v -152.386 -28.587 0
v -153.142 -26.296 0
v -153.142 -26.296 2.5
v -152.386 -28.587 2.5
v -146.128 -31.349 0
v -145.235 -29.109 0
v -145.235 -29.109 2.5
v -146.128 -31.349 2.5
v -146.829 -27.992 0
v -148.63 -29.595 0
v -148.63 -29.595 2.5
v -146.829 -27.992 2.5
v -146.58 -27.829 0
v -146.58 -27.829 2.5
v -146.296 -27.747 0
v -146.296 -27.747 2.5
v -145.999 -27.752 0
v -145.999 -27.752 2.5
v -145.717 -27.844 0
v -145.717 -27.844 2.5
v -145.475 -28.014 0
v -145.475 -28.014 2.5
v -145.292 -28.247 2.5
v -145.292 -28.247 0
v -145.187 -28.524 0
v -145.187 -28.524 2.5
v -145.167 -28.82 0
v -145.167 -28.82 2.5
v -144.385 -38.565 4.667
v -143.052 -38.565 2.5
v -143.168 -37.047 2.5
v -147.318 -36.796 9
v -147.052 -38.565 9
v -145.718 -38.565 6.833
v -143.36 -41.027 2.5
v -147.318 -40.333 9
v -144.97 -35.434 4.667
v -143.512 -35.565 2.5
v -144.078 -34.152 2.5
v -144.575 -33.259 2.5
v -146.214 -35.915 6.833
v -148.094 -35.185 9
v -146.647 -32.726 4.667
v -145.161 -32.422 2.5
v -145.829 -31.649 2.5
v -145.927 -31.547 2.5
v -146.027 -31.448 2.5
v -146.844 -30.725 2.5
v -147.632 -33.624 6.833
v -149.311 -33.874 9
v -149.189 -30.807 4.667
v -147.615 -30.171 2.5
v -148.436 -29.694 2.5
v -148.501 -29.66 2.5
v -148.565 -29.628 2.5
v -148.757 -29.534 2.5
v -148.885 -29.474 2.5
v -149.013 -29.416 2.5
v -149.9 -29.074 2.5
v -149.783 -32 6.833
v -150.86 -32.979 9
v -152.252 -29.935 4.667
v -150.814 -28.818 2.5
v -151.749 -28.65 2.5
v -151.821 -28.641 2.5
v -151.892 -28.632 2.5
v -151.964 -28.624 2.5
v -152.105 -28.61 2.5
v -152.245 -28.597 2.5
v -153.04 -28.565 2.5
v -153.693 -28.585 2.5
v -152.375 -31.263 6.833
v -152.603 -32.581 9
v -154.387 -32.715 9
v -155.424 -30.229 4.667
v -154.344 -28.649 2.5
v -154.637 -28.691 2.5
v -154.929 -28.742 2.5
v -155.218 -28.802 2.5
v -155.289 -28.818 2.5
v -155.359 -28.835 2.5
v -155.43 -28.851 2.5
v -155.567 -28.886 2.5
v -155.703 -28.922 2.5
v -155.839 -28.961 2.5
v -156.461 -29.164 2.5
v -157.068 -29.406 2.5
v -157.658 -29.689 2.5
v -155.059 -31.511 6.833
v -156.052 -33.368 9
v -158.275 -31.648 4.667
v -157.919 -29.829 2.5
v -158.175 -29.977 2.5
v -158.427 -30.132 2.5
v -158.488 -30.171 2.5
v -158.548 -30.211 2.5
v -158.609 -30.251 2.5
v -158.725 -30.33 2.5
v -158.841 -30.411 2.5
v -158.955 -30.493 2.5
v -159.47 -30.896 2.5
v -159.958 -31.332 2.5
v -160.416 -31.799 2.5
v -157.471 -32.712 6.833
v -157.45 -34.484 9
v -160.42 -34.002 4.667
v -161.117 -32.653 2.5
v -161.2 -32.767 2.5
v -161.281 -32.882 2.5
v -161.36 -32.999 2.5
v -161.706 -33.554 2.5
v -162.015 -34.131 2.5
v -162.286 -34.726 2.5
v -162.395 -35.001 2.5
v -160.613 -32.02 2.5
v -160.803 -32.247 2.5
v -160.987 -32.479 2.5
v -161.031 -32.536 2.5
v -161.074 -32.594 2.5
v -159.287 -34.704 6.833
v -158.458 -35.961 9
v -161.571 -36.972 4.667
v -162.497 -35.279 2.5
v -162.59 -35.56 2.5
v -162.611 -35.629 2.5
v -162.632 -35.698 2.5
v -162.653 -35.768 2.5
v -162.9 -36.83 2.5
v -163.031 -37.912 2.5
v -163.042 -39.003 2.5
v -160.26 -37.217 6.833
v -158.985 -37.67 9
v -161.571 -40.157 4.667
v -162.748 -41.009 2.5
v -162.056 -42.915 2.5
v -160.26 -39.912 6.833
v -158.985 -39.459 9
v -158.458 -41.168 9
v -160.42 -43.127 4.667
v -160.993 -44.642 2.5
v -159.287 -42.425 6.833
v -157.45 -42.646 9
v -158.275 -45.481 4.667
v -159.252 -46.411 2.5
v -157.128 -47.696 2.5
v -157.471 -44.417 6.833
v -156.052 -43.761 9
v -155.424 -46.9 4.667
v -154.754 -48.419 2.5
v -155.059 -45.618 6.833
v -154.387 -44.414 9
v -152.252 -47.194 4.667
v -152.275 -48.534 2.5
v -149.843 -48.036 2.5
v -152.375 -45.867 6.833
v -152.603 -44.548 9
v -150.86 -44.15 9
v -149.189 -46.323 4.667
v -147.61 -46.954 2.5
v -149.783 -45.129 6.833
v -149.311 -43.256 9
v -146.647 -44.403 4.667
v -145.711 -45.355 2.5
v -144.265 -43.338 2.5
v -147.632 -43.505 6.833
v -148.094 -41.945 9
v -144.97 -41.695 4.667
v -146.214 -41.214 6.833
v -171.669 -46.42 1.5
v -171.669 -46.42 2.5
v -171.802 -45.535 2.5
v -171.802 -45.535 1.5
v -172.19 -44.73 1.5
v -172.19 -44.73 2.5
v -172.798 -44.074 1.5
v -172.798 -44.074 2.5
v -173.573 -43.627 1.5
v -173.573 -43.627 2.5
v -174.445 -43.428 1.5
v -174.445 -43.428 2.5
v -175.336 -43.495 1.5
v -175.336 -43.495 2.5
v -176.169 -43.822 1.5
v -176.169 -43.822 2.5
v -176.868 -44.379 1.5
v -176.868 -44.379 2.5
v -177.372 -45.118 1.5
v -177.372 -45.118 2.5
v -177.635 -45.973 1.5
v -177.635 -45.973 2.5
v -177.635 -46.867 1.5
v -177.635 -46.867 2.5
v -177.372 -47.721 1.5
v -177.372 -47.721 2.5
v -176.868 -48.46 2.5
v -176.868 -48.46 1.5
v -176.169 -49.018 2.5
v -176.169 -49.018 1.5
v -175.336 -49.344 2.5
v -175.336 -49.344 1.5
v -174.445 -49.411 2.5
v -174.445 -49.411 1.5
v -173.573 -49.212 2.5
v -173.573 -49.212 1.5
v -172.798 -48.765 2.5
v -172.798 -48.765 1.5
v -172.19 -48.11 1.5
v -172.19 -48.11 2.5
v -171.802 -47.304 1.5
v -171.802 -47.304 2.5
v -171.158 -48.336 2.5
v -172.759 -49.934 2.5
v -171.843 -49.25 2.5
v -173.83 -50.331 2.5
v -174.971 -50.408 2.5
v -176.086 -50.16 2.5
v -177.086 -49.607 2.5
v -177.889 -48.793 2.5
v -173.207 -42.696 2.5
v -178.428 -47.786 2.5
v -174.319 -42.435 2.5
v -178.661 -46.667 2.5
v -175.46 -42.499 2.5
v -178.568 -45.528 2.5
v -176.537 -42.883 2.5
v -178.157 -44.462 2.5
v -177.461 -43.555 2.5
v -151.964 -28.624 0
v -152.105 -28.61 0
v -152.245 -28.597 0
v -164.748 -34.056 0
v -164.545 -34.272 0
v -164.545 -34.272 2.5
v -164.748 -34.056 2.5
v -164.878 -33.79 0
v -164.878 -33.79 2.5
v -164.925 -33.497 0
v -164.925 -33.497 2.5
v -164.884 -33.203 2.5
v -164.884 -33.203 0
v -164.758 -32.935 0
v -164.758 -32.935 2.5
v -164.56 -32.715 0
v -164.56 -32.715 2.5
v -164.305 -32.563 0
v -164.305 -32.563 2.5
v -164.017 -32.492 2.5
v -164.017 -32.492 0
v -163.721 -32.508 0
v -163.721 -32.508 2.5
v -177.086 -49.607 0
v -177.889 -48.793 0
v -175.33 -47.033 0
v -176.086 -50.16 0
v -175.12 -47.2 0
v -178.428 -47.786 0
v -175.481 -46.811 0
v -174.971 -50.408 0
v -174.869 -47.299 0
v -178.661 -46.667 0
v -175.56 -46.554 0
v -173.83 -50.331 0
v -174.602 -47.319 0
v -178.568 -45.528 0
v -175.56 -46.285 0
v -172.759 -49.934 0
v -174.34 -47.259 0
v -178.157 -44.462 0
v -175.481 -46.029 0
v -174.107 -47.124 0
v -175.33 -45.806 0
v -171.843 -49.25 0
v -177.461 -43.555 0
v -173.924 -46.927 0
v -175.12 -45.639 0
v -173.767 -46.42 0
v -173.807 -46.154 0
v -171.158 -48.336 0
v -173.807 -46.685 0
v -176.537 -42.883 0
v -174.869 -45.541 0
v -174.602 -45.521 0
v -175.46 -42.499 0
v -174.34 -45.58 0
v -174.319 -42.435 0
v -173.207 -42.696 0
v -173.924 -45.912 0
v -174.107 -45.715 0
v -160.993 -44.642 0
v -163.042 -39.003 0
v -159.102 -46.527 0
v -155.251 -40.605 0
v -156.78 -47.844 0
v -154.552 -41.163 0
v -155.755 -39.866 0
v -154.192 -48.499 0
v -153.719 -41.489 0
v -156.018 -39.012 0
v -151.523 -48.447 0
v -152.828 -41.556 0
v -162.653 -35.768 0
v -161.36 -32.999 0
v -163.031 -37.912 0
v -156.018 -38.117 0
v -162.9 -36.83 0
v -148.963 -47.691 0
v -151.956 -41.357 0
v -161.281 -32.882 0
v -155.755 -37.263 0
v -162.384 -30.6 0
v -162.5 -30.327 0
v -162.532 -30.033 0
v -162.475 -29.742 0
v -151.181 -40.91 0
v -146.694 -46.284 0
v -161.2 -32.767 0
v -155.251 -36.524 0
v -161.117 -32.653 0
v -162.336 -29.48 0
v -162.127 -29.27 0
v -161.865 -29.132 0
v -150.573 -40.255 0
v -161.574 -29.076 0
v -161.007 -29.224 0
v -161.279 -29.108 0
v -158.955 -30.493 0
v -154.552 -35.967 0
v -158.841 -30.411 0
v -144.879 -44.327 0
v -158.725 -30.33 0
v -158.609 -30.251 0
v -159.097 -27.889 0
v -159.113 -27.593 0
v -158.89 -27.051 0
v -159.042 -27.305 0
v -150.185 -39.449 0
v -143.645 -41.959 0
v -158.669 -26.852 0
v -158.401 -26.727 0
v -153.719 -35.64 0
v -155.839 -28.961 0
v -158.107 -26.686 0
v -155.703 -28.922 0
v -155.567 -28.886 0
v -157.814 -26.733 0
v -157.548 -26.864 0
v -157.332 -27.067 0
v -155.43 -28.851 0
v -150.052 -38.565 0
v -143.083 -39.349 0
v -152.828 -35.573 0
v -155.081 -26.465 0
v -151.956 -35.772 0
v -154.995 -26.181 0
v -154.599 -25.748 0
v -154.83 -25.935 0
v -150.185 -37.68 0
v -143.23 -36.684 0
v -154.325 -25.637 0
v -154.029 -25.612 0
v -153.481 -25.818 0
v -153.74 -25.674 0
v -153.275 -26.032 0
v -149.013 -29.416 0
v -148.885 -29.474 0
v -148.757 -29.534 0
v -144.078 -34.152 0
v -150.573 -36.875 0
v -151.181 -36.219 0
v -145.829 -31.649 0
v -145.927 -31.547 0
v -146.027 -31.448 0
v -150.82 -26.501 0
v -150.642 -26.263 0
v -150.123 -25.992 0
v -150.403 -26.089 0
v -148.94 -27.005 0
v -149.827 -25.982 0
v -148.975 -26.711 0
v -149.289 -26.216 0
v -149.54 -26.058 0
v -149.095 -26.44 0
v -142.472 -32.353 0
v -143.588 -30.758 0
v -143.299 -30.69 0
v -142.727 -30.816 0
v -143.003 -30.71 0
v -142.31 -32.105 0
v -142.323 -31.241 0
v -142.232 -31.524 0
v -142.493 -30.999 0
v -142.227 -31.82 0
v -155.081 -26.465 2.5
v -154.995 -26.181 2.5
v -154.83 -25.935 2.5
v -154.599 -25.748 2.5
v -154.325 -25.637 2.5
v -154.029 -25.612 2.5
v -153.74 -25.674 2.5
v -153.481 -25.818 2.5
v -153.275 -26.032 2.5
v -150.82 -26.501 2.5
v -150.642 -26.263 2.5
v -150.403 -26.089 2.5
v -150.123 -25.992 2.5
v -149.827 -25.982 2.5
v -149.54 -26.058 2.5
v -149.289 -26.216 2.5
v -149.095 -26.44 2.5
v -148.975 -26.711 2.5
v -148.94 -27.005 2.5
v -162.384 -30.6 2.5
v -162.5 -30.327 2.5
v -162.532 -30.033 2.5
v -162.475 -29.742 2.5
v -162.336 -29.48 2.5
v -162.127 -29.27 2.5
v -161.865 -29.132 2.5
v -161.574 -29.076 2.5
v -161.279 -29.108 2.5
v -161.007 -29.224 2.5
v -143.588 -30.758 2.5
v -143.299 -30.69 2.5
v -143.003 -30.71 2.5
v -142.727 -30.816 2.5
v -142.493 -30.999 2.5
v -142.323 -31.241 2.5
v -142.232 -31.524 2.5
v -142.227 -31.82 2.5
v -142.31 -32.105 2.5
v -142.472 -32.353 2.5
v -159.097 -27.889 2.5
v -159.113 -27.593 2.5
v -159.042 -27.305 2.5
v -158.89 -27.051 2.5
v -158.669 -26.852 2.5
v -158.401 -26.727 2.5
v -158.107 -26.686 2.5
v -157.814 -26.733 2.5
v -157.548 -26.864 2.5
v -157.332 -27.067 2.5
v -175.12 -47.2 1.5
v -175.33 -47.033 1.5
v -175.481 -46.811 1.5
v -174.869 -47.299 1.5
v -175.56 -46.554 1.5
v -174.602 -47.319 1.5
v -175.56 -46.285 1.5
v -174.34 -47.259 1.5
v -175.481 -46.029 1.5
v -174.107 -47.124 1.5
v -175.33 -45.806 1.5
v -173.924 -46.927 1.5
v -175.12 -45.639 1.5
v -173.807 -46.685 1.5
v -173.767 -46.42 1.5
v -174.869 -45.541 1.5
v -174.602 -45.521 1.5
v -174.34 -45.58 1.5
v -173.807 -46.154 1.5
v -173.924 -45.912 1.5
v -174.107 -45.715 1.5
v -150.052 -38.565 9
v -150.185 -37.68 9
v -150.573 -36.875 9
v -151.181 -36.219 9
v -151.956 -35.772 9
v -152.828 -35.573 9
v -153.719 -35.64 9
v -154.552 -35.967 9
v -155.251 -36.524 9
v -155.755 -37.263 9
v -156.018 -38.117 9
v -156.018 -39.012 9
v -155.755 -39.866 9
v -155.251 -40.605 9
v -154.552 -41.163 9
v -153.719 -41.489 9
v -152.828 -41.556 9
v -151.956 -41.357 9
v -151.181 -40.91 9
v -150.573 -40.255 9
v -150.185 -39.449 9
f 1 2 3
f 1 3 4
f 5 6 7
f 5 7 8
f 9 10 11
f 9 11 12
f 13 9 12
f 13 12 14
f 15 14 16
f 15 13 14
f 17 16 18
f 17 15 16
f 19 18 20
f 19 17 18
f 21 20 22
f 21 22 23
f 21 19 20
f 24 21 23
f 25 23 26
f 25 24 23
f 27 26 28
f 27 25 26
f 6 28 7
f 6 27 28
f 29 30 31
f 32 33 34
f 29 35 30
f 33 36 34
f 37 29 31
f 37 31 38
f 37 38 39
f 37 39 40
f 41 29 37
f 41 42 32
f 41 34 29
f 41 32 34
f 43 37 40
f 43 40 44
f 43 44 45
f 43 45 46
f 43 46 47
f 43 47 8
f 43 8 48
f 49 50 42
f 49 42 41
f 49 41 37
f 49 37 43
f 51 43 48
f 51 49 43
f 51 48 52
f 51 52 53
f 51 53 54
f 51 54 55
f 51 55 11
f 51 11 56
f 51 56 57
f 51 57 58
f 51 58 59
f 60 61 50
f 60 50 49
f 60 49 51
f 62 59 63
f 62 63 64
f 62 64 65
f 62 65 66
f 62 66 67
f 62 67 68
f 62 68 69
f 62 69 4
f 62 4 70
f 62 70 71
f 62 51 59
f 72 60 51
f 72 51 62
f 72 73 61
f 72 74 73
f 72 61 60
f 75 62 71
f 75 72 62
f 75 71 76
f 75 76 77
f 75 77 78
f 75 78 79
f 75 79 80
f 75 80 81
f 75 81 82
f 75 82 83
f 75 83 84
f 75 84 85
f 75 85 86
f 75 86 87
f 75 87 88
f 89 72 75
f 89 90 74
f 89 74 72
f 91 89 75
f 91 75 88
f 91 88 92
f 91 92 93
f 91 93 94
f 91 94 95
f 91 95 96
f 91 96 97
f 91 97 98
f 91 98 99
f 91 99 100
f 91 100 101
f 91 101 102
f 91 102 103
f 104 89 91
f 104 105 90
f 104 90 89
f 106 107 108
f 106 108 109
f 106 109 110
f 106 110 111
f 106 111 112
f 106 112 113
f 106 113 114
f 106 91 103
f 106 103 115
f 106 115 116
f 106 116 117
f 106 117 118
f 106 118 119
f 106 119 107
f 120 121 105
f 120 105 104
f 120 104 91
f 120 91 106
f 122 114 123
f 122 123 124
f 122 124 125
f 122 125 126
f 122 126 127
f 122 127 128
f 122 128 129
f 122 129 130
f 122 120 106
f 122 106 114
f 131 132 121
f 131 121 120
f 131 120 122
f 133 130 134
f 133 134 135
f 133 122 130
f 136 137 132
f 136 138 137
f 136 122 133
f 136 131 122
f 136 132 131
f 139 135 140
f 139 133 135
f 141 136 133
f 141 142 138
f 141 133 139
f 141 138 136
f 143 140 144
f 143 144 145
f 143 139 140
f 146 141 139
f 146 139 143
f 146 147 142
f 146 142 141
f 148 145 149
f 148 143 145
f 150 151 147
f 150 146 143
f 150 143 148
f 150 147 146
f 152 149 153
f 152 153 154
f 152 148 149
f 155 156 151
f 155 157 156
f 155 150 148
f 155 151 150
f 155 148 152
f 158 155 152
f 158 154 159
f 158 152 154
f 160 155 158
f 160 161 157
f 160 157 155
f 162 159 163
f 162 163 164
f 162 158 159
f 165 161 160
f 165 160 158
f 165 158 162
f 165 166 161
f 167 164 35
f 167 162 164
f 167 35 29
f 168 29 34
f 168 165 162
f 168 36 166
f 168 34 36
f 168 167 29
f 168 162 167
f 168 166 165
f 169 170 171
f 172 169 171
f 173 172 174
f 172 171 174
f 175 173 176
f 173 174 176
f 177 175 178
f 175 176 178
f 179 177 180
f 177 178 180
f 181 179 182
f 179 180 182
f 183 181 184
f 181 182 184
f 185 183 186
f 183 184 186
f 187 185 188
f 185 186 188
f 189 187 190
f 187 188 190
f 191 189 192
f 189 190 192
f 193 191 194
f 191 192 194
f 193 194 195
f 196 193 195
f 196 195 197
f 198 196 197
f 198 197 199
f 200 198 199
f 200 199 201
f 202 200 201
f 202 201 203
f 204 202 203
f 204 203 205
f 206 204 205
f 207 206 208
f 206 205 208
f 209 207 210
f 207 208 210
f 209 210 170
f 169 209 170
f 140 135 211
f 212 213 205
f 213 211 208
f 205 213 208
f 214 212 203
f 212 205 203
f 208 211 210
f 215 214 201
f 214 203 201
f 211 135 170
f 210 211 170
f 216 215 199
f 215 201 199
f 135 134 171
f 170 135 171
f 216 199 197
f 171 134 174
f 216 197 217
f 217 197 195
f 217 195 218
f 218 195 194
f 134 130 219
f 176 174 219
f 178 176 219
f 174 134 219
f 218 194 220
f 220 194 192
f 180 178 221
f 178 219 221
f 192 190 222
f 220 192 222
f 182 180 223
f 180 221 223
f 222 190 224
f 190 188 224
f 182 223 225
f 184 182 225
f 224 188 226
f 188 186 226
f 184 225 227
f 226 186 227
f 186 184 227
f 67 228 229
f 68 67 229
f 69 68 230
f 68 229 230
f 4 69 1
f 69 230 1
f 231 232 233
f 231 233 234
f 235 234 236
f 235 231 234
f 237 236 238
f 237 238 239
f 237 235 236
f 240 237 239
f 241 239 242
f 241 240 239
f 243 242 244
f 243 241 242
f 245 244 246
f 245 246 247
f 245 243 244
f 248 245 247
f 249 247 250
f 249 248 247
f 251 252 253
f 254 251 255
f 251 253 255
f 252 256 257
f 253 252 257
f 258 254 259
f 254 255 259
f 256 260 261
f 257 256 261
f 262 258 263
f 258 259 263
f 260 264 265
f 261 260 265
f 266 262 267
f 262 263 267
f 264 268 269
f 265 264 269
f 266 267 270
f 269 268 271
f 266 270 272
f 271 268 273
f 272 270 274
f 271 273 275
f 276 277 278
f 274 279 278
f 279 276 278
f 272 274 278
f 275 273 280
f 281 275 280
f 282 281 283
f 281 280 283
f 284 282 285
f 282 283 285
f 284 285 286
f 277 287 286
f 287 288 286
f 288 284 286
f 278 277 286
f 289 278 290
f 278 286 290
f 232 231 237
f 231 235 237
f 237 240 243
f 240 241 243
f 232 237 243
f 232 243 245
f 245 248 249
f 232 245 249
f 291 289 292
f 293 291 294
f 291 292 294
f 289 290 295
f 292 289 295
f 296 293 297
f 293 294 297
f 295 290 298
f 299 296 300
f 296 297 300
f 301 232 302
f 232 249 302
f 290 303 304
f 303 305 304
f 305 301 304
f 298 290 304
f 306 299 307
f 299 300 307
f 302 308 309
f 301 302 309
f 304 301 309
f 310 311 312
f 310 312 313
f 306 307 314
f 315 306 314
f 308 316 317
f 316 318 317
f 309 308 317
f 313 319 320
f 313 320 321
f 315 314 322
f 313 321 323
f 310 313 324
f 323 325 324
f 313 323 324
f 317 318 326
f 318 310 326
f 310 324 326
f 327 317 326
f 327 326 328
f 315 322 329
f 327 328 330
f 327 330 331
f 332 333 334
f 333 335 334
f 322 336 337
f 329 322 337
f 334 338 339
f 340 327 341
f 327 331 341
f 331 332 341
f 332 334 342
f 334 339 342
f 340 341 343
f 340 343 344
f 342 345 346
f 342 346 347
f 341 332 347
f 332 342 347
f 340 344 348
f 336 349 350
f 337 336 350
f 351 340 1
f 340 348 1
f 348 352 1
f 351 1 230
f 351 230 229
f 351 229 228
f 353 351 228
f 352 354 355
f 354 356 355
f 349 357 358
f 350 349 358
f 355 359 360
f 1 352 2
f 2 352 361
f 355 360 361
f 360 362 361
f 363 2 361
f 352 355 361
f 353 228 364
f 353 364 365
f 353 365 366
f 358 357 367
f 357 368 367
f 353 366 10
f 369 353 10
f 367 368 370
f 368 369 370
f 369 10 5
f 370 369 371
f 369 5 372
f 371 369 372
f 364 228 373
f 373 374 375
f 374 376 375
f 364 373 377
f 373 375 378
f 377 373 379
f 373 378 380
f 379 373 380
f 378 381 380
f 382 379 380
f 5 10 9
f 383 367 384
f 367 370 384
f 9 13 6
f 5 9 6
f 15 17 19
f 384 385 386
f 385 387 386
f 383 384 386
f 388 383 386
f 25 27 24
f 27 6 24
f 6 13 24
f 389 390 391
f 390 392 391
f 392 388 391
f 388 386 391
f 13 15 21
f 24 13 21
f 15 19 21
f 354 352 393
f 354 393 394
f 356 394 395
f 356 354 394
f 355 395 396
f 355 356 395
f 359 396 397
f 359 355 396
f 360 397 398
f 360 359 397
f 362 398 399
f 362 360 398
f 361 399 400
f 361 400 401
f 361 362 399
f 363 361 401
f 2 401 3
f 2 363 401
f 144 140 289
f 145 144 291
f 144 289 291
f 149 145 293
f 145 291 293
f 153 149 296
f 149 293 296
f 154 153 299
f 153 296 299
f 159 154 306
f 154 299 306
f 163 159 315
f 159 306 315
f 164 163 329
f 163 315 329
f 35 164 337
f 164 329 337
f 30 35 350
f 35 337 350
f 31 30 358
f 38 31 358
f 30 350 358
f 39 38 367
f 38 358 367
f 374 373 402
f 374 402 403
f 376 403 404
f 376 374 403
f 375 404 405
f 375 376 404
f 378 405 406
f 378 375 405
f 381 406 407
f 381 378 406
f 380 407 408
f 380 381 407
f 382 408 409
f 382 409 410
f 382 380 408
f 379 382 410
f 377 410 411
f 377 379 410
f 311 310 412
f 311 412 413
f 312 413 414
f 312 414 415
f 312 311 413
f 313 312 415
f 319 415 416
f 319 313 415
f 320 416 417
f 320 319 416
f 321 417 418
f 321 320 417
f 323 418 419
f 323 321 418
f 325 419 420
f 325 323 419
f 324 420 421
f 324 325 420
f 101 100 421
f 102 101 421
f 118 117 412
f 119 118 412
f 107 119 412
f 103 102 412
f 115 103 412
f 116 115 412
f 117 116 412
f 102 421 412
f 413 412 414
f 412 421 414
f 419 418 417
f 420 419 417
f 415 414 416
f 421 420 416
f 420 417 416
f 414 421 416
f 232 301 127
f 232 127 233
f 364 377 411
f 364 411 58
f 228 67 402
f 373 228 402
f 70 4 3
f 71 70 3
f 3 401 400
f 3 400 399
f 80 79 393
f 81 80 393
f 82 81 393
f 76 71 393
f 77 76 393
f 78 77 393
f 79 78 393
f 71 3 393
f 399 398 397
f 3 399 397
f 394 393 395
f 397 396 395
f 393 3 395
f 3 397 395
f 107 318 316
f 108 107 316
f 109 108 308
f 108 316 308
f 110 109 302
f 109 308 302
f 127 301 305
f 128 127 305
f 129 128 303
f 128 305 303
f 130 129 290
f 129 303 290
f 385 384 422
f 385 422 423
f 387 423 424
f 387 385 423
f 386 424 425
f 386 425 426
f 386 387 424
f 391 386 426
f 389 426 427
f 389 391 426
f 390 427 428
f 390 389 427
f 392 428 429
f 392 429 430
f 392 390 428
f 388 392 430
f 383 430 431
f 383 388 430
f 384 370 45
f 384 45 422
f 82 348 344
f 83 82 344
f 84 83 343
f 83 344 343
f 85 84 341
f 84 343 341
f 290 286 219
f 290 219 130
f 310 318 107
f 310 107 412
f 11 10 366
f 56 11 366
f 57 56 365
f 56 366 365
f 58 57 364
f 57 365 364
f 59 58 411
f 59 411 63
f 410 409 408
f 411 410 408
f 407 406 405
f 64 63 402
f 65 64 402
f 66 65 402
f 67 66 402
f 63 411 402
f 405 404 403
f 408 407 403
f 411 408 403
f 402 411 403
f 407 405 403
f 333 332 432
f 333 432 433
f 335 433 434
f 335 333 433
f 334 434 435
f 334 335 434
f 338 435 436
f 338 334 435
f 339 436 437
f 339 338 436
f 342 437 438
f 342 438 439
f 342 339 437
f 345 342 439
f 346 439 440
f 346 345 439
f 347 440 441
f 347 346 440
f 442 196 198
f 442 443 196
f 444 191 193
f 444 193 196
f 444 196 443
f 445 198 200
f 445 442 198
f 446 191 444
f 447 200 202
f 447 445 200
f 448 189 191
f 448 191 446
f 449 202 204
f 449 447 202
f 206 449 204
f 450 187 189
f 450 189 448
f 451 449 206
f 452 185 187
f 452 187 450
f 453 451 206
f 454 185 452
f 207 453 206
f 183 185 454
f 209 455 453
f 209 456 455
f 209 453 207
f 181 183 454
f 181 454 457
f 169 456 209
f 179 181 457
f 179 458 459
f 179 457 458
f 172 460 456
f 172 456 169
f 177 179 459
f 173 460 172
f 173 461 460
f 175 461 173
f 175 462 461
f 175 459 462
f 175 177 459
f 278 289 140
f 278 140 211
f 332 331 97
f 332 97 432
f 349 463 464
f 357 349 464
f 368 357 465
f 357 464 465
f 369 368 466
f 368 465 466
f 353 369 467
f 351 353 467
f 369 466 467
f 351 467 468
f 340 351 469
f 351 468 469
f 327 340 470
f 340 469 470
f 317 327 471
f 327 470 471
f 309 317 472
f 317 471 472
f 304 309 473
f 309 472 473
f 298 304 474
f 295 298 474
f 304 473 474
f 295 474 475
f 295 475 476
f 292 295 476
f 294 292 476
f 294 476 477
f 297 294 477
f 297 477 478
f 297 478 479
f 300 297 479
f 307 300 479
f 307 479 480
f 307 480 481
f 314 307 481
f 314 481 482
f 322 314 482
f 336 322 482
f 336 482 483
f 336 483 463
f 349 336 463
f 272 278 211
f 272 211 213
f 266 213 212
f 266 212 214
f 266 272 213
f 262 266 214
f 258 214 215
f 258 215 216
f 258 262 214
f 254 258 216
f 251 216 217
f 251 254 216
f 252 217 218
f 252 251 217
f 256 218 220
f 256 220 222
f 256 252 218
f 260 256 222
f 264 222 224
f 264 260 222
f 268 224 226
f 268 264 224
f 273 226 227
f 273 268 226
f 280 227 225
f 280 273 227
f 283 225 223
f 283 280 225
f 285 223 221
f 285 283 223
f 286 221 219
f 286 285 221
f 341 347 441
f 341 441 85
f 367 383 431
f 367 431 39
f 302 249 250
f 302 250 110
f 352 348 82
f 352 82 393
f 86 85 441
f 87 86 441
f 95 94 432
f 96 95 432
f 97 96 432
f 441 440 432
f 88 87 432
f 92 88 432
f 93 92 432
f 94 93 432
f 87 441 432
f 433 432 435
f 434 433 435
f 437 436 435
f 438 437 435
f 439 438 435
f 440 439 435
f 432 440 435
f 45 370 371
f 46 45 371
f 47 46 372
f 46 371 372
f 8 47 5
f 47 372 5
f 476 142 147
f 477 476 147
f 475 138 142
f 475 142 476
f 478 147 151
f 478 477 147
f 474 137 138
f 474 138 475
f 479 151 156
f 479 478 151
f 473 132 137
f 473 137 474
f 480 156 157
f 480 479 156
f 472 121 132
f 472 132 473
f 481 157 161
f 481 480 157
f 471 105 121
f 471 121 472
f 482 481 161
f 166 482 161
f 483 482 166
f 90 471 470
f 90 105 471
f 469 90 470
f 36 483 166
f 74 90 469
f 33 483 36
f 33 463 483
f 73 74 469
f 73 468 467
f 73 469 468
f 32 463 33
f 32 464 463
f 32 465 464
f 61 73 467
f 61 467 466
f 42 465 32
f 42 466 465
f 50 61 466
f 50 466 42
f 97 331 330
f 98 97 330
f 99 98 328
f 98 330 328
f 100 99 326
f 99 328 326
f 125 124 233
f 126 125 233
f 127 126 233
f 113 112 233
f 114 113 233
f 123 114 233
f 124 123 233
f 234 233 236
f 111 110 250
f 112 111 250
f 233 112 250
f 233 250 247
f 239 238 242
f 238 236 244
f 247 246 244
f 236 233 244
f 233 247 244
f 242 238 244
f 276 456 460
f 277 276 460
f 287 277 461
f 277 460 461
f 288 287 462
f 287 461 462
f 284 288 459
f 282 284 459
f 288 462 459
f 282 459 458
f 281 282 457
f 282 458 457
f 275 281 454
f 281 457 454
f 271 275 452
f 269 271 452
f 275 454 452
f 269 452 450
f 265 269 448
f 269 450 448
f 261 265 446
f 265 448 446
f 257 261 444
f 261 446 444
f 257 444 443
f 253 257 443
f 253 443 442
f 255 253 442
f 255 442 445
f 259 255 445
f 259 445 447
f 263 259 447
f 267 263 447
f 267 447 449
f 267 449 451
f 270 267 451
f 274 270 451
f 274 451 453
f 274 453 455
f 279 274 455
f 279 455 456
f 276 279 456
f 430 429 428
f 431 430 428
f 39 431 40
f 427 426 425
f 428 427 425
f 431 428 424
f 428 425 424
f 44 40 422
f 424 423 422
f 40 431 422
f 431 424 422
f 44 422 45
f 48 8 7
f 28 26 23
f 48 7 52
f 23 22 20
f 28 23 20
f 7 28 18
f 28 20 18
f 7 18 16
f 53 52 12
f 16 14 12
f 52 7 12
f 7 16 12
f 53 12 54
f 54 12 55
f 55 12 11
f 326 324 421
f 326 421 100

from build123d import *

# Parameters (mm, degrees)
CROQUIS1_R              = 10
SALIENTE_EXTRUIR1_DEPTH = 9
CHAFL_N1_SIZE           = 6.5
CHAFL_N1_SIZE2          = 4
SALIENTE_EXTRUIR3_DEPTH = 2.5
CROQUIS4_R              = 3
CORTAR_EXTRUIR1_DEPTH   = 186.864758197
CROQUIS5_R              = 3
CORTAR_EXTRUIR2_DEPTH   = 1
CROQUIS6_R              = 0.901496021
CORTAR_EXTRUIR3_DEPTH   = 16
SALIENTE_EXTRUIR4_DEPTH = 2.5


with BuildPart() as part:
    # Croquis1 → Saliente-Extruir1 (new body)
    with BuildSketch(Plane.XY):
        with Locations((-153.051797491, -38.56459666)):
            Circle(CROQUIS1_R)
    extrude(amount=SALIENTE_EXTRUIR1_DEPTH)

    # Chaflán1
    chafl_n1_edges = [part.edges().sort_by_distance(p)[0] for p in [
        (-163.051797491, -38.56459666, 9),
    ]]
    chafl_n1_side = [part.faces().sort_by_distance(p)[0] for p in [
        (-163.051797491, -38.56459666, 4.5),
    ]]
    chamfer(chafl_n1_edges, length=CHAFL_N1_SIZE, length2=CHAFL_N1_SIZE2, reference=chafl_n1_side[0])

    # Croquis3 → Saliente-Extruir3 (add)
    with BuildSketch(Plane(origin=(0, 0, 0), x_dir=(-1, 0, 0), z_dir=(0, 0, -1))):
        with BuildLine():
            Line((152.02722324, -41.384215004), (171.157627564, -48.335694708))
            ThreePointArc((171.157627564, -48.335694708), (178.428362583, -47.785764923), (173.206776067, -42.696458021))
            Line((173.206776067, -42.696458021), (154.076371743, -35.744978316))
            Line((154.076371743, -35.744978316), (152.02722324, -41.384215004))
        make_face()
    extrude(amount=-SALIENTE_EXTRUIR3_DEPTH)

    # Croquis4 → Cortar-Extruir1 (cut, through all)
    with BuildSketch(Plane.XY.offset(9)):
        with Locations((-153.051797491, -38.56459666)):
            Circle(CROQUIS4_R)
    extrude(amount=-CORTAR_EXTRUIR1_DEPTH, mode=Mode.SUBTRACT)

    # Croquis5 → Cortar-Extruir2 (cut)
    with BuildSketch(Plane.XY.offset(2.5)):
        with Locations((-174.668871458, -46.419665921)):
            Circle(CROQUIS5_R)
    extrude(amount=-CORTAR_EXTRUIR2_DEPTH, mode=Mode.SUBTRACT)

    # Croquis6 → Cortar-Extruir3 (cut)
    with BuildSketch(Plane.XY.offset(1.5)):
        with Locations((-174.668871458, -46.419665921)):
            Circle(CROQUIS6_R)
    extrude(amount=-CORTAR_EXTRUIR3_DEPTH, mode=Mode.SUBTRACT)

    # Croquis7 → Saliente-Extruir4 (add)
    with BuildSketch(Plane(origin=(0, 0, 0), x_dir=(-1, 0, 0), z_dir=(0, 0, -1))):
        with BuildLine():
            Line((142.472154892, -32.352593723), (144.077837211, -34.152336821))
            ThreePointArc((144.077837211, -34.152336821), (144.857254661, -32.833151134), (145.829058872, -31.648525027))
            Line((145.829058872, -31.648525027), (143.587737332, -30.757588058))
            ThreePointArc((143.587737332, -30.757588058), (142.398891813, -31.113717477), (142.472154892, -32.352593723))
        make_face()
        with BuildLine():
            Line((145.234815545, -29.108772462), (146.128114979, -31.349153467))
            ThreePointArc((146.128114979, -31.349153467), (147.223071886, -30.438960819), (148.436199285, -29.693505791))
            ThreePointArc((148.436199285, -29.693505791), (148.532872379, -29.643872708), (148.63007912, -29.595293084))
            Line((148.63007912, -29.595293084), (146.828644198, -27.991509074))
            ThreePointArc((146.828644198, -27.991509074), (145.589691401, -27.919552146), (145.234815545, -29.108772462))
        make_face()
        with BuildLine():
            Line((148.940319587, -27.005463152), (149.013491041, -29.416259051))
            ThreePointArc((149.013491041, -29.416259051), (150.353718186, -28.935455054), (151.748645686, -28.649870472))
            ThreePointArc((151.748645686, -28.649870472), (151.856464194, -28.636294775), (151.964423861, -28.623891525))
            Line((151.964423861, -28.623891525), (150.820155195, -26.500700496))
            ThreePointArc((150.820155195, -26.500700496), (149.680531113, -26.009336288), (148.940319587, -27.005463152))
        make_face()
        with BuildLine():
            ThreePointArc((155.218271428, -28.802097457), (155.324230846, -28.826216577), (155.42992191, -28.851485714))
            Line((155.42992191, -28.851485714), (155.080835189, -26.464975839))
            ThreePointArc((155.080835189, -26.464975839), (154.177995305, -25.613470127), (153.141728543, -26.296355938))
            Line((153.141728543, -26.296355938), (152.38594646, -28.586789165))
            ThreePointArc((152.38594646, -28.586789165), (153.366736356, -28.569557215), (154.344495765, -28.648502108))
            ThreePointArc((154.344495765, -28.648502108), (154.783087756, -28.715605137), (155.218271428, -28.802097457))
        make_face()
        with BuildLine():
            ThreePointArc((158.426588439, -30.131825925), (158.517908498, -30.190730739), (158.608583057, -30.250624434))
            Line((158.608583057, -30.250624434), (159.09678329, -27.888644024))
            ThreePointArc((159.09678329, -27.888644024), (158.53962342, -26.779700963), (157.332290487, -27.066979615))
            Line((157.332290487, -27.066979615), (155.83871334, -28.96079012))
            ThreePointArc((155.83871334, -28.96079012), (156.766248042, -29.280047284), (157.6580406, -29.688644631))
            ThreePointArc((157.6580406, -29.688644631), (158.047231669, -29.901708148), (158.426588439, -30.131825925))
        make_face()
        with BuildLine():
            ThreePointArc((160.986626339, -32.478670998), (161.052292491, -32.565256717), (161.117013855, -32.652550905))
            Line((161.117013855, -32.652550905), (162.38361689, -30.599989658))
            ThreePointArc((162.38361689, -30.599989658), (162.239338735, -29.367364148), (161.006561803, -29.224385594))
            Line((161.006561803, -29.224385594), (158.955337038, -30.493151881))
            ThreePointArc((158.955337038, -30.493151881), (159.717742172, -31.110391034), (160.416004535, -31.799357964))
            ThreePointArc((160.416004535, -31.799357964), (160.708852496, -32.132683364), (160.986626339, -32.478670998))
        make_face()
        with BuildLine():
            ThreePointArc((162.589606773, -35.559568525), (162.621698713, -35.663391632), (162.652660529, -35.767557347))
            Line((162.652660529, -35.767557347), (164.544895347, -34.271984441))
            ThreePointArc((164.544895347, -34.271984441), (164.830900984, -33.06434931), (163.721371142, -32.508358875))
            Line((163.721371142, -32.508358875), (161.35990674, -32.999049004))
            ThreePointArc((161.35990674, -32.999049004), (161.865224995, -33.839821995), (162.285736417, -34.726058929))
            ThreePointArc((162.285736417, -34.726058929), (162.446919484, -35.139442249), (162.589606773, -35.559568525))
        make_face()
    extrude(amount=-SALIENTE_EXTRUIR4_DEPTH)


solid = part.part
